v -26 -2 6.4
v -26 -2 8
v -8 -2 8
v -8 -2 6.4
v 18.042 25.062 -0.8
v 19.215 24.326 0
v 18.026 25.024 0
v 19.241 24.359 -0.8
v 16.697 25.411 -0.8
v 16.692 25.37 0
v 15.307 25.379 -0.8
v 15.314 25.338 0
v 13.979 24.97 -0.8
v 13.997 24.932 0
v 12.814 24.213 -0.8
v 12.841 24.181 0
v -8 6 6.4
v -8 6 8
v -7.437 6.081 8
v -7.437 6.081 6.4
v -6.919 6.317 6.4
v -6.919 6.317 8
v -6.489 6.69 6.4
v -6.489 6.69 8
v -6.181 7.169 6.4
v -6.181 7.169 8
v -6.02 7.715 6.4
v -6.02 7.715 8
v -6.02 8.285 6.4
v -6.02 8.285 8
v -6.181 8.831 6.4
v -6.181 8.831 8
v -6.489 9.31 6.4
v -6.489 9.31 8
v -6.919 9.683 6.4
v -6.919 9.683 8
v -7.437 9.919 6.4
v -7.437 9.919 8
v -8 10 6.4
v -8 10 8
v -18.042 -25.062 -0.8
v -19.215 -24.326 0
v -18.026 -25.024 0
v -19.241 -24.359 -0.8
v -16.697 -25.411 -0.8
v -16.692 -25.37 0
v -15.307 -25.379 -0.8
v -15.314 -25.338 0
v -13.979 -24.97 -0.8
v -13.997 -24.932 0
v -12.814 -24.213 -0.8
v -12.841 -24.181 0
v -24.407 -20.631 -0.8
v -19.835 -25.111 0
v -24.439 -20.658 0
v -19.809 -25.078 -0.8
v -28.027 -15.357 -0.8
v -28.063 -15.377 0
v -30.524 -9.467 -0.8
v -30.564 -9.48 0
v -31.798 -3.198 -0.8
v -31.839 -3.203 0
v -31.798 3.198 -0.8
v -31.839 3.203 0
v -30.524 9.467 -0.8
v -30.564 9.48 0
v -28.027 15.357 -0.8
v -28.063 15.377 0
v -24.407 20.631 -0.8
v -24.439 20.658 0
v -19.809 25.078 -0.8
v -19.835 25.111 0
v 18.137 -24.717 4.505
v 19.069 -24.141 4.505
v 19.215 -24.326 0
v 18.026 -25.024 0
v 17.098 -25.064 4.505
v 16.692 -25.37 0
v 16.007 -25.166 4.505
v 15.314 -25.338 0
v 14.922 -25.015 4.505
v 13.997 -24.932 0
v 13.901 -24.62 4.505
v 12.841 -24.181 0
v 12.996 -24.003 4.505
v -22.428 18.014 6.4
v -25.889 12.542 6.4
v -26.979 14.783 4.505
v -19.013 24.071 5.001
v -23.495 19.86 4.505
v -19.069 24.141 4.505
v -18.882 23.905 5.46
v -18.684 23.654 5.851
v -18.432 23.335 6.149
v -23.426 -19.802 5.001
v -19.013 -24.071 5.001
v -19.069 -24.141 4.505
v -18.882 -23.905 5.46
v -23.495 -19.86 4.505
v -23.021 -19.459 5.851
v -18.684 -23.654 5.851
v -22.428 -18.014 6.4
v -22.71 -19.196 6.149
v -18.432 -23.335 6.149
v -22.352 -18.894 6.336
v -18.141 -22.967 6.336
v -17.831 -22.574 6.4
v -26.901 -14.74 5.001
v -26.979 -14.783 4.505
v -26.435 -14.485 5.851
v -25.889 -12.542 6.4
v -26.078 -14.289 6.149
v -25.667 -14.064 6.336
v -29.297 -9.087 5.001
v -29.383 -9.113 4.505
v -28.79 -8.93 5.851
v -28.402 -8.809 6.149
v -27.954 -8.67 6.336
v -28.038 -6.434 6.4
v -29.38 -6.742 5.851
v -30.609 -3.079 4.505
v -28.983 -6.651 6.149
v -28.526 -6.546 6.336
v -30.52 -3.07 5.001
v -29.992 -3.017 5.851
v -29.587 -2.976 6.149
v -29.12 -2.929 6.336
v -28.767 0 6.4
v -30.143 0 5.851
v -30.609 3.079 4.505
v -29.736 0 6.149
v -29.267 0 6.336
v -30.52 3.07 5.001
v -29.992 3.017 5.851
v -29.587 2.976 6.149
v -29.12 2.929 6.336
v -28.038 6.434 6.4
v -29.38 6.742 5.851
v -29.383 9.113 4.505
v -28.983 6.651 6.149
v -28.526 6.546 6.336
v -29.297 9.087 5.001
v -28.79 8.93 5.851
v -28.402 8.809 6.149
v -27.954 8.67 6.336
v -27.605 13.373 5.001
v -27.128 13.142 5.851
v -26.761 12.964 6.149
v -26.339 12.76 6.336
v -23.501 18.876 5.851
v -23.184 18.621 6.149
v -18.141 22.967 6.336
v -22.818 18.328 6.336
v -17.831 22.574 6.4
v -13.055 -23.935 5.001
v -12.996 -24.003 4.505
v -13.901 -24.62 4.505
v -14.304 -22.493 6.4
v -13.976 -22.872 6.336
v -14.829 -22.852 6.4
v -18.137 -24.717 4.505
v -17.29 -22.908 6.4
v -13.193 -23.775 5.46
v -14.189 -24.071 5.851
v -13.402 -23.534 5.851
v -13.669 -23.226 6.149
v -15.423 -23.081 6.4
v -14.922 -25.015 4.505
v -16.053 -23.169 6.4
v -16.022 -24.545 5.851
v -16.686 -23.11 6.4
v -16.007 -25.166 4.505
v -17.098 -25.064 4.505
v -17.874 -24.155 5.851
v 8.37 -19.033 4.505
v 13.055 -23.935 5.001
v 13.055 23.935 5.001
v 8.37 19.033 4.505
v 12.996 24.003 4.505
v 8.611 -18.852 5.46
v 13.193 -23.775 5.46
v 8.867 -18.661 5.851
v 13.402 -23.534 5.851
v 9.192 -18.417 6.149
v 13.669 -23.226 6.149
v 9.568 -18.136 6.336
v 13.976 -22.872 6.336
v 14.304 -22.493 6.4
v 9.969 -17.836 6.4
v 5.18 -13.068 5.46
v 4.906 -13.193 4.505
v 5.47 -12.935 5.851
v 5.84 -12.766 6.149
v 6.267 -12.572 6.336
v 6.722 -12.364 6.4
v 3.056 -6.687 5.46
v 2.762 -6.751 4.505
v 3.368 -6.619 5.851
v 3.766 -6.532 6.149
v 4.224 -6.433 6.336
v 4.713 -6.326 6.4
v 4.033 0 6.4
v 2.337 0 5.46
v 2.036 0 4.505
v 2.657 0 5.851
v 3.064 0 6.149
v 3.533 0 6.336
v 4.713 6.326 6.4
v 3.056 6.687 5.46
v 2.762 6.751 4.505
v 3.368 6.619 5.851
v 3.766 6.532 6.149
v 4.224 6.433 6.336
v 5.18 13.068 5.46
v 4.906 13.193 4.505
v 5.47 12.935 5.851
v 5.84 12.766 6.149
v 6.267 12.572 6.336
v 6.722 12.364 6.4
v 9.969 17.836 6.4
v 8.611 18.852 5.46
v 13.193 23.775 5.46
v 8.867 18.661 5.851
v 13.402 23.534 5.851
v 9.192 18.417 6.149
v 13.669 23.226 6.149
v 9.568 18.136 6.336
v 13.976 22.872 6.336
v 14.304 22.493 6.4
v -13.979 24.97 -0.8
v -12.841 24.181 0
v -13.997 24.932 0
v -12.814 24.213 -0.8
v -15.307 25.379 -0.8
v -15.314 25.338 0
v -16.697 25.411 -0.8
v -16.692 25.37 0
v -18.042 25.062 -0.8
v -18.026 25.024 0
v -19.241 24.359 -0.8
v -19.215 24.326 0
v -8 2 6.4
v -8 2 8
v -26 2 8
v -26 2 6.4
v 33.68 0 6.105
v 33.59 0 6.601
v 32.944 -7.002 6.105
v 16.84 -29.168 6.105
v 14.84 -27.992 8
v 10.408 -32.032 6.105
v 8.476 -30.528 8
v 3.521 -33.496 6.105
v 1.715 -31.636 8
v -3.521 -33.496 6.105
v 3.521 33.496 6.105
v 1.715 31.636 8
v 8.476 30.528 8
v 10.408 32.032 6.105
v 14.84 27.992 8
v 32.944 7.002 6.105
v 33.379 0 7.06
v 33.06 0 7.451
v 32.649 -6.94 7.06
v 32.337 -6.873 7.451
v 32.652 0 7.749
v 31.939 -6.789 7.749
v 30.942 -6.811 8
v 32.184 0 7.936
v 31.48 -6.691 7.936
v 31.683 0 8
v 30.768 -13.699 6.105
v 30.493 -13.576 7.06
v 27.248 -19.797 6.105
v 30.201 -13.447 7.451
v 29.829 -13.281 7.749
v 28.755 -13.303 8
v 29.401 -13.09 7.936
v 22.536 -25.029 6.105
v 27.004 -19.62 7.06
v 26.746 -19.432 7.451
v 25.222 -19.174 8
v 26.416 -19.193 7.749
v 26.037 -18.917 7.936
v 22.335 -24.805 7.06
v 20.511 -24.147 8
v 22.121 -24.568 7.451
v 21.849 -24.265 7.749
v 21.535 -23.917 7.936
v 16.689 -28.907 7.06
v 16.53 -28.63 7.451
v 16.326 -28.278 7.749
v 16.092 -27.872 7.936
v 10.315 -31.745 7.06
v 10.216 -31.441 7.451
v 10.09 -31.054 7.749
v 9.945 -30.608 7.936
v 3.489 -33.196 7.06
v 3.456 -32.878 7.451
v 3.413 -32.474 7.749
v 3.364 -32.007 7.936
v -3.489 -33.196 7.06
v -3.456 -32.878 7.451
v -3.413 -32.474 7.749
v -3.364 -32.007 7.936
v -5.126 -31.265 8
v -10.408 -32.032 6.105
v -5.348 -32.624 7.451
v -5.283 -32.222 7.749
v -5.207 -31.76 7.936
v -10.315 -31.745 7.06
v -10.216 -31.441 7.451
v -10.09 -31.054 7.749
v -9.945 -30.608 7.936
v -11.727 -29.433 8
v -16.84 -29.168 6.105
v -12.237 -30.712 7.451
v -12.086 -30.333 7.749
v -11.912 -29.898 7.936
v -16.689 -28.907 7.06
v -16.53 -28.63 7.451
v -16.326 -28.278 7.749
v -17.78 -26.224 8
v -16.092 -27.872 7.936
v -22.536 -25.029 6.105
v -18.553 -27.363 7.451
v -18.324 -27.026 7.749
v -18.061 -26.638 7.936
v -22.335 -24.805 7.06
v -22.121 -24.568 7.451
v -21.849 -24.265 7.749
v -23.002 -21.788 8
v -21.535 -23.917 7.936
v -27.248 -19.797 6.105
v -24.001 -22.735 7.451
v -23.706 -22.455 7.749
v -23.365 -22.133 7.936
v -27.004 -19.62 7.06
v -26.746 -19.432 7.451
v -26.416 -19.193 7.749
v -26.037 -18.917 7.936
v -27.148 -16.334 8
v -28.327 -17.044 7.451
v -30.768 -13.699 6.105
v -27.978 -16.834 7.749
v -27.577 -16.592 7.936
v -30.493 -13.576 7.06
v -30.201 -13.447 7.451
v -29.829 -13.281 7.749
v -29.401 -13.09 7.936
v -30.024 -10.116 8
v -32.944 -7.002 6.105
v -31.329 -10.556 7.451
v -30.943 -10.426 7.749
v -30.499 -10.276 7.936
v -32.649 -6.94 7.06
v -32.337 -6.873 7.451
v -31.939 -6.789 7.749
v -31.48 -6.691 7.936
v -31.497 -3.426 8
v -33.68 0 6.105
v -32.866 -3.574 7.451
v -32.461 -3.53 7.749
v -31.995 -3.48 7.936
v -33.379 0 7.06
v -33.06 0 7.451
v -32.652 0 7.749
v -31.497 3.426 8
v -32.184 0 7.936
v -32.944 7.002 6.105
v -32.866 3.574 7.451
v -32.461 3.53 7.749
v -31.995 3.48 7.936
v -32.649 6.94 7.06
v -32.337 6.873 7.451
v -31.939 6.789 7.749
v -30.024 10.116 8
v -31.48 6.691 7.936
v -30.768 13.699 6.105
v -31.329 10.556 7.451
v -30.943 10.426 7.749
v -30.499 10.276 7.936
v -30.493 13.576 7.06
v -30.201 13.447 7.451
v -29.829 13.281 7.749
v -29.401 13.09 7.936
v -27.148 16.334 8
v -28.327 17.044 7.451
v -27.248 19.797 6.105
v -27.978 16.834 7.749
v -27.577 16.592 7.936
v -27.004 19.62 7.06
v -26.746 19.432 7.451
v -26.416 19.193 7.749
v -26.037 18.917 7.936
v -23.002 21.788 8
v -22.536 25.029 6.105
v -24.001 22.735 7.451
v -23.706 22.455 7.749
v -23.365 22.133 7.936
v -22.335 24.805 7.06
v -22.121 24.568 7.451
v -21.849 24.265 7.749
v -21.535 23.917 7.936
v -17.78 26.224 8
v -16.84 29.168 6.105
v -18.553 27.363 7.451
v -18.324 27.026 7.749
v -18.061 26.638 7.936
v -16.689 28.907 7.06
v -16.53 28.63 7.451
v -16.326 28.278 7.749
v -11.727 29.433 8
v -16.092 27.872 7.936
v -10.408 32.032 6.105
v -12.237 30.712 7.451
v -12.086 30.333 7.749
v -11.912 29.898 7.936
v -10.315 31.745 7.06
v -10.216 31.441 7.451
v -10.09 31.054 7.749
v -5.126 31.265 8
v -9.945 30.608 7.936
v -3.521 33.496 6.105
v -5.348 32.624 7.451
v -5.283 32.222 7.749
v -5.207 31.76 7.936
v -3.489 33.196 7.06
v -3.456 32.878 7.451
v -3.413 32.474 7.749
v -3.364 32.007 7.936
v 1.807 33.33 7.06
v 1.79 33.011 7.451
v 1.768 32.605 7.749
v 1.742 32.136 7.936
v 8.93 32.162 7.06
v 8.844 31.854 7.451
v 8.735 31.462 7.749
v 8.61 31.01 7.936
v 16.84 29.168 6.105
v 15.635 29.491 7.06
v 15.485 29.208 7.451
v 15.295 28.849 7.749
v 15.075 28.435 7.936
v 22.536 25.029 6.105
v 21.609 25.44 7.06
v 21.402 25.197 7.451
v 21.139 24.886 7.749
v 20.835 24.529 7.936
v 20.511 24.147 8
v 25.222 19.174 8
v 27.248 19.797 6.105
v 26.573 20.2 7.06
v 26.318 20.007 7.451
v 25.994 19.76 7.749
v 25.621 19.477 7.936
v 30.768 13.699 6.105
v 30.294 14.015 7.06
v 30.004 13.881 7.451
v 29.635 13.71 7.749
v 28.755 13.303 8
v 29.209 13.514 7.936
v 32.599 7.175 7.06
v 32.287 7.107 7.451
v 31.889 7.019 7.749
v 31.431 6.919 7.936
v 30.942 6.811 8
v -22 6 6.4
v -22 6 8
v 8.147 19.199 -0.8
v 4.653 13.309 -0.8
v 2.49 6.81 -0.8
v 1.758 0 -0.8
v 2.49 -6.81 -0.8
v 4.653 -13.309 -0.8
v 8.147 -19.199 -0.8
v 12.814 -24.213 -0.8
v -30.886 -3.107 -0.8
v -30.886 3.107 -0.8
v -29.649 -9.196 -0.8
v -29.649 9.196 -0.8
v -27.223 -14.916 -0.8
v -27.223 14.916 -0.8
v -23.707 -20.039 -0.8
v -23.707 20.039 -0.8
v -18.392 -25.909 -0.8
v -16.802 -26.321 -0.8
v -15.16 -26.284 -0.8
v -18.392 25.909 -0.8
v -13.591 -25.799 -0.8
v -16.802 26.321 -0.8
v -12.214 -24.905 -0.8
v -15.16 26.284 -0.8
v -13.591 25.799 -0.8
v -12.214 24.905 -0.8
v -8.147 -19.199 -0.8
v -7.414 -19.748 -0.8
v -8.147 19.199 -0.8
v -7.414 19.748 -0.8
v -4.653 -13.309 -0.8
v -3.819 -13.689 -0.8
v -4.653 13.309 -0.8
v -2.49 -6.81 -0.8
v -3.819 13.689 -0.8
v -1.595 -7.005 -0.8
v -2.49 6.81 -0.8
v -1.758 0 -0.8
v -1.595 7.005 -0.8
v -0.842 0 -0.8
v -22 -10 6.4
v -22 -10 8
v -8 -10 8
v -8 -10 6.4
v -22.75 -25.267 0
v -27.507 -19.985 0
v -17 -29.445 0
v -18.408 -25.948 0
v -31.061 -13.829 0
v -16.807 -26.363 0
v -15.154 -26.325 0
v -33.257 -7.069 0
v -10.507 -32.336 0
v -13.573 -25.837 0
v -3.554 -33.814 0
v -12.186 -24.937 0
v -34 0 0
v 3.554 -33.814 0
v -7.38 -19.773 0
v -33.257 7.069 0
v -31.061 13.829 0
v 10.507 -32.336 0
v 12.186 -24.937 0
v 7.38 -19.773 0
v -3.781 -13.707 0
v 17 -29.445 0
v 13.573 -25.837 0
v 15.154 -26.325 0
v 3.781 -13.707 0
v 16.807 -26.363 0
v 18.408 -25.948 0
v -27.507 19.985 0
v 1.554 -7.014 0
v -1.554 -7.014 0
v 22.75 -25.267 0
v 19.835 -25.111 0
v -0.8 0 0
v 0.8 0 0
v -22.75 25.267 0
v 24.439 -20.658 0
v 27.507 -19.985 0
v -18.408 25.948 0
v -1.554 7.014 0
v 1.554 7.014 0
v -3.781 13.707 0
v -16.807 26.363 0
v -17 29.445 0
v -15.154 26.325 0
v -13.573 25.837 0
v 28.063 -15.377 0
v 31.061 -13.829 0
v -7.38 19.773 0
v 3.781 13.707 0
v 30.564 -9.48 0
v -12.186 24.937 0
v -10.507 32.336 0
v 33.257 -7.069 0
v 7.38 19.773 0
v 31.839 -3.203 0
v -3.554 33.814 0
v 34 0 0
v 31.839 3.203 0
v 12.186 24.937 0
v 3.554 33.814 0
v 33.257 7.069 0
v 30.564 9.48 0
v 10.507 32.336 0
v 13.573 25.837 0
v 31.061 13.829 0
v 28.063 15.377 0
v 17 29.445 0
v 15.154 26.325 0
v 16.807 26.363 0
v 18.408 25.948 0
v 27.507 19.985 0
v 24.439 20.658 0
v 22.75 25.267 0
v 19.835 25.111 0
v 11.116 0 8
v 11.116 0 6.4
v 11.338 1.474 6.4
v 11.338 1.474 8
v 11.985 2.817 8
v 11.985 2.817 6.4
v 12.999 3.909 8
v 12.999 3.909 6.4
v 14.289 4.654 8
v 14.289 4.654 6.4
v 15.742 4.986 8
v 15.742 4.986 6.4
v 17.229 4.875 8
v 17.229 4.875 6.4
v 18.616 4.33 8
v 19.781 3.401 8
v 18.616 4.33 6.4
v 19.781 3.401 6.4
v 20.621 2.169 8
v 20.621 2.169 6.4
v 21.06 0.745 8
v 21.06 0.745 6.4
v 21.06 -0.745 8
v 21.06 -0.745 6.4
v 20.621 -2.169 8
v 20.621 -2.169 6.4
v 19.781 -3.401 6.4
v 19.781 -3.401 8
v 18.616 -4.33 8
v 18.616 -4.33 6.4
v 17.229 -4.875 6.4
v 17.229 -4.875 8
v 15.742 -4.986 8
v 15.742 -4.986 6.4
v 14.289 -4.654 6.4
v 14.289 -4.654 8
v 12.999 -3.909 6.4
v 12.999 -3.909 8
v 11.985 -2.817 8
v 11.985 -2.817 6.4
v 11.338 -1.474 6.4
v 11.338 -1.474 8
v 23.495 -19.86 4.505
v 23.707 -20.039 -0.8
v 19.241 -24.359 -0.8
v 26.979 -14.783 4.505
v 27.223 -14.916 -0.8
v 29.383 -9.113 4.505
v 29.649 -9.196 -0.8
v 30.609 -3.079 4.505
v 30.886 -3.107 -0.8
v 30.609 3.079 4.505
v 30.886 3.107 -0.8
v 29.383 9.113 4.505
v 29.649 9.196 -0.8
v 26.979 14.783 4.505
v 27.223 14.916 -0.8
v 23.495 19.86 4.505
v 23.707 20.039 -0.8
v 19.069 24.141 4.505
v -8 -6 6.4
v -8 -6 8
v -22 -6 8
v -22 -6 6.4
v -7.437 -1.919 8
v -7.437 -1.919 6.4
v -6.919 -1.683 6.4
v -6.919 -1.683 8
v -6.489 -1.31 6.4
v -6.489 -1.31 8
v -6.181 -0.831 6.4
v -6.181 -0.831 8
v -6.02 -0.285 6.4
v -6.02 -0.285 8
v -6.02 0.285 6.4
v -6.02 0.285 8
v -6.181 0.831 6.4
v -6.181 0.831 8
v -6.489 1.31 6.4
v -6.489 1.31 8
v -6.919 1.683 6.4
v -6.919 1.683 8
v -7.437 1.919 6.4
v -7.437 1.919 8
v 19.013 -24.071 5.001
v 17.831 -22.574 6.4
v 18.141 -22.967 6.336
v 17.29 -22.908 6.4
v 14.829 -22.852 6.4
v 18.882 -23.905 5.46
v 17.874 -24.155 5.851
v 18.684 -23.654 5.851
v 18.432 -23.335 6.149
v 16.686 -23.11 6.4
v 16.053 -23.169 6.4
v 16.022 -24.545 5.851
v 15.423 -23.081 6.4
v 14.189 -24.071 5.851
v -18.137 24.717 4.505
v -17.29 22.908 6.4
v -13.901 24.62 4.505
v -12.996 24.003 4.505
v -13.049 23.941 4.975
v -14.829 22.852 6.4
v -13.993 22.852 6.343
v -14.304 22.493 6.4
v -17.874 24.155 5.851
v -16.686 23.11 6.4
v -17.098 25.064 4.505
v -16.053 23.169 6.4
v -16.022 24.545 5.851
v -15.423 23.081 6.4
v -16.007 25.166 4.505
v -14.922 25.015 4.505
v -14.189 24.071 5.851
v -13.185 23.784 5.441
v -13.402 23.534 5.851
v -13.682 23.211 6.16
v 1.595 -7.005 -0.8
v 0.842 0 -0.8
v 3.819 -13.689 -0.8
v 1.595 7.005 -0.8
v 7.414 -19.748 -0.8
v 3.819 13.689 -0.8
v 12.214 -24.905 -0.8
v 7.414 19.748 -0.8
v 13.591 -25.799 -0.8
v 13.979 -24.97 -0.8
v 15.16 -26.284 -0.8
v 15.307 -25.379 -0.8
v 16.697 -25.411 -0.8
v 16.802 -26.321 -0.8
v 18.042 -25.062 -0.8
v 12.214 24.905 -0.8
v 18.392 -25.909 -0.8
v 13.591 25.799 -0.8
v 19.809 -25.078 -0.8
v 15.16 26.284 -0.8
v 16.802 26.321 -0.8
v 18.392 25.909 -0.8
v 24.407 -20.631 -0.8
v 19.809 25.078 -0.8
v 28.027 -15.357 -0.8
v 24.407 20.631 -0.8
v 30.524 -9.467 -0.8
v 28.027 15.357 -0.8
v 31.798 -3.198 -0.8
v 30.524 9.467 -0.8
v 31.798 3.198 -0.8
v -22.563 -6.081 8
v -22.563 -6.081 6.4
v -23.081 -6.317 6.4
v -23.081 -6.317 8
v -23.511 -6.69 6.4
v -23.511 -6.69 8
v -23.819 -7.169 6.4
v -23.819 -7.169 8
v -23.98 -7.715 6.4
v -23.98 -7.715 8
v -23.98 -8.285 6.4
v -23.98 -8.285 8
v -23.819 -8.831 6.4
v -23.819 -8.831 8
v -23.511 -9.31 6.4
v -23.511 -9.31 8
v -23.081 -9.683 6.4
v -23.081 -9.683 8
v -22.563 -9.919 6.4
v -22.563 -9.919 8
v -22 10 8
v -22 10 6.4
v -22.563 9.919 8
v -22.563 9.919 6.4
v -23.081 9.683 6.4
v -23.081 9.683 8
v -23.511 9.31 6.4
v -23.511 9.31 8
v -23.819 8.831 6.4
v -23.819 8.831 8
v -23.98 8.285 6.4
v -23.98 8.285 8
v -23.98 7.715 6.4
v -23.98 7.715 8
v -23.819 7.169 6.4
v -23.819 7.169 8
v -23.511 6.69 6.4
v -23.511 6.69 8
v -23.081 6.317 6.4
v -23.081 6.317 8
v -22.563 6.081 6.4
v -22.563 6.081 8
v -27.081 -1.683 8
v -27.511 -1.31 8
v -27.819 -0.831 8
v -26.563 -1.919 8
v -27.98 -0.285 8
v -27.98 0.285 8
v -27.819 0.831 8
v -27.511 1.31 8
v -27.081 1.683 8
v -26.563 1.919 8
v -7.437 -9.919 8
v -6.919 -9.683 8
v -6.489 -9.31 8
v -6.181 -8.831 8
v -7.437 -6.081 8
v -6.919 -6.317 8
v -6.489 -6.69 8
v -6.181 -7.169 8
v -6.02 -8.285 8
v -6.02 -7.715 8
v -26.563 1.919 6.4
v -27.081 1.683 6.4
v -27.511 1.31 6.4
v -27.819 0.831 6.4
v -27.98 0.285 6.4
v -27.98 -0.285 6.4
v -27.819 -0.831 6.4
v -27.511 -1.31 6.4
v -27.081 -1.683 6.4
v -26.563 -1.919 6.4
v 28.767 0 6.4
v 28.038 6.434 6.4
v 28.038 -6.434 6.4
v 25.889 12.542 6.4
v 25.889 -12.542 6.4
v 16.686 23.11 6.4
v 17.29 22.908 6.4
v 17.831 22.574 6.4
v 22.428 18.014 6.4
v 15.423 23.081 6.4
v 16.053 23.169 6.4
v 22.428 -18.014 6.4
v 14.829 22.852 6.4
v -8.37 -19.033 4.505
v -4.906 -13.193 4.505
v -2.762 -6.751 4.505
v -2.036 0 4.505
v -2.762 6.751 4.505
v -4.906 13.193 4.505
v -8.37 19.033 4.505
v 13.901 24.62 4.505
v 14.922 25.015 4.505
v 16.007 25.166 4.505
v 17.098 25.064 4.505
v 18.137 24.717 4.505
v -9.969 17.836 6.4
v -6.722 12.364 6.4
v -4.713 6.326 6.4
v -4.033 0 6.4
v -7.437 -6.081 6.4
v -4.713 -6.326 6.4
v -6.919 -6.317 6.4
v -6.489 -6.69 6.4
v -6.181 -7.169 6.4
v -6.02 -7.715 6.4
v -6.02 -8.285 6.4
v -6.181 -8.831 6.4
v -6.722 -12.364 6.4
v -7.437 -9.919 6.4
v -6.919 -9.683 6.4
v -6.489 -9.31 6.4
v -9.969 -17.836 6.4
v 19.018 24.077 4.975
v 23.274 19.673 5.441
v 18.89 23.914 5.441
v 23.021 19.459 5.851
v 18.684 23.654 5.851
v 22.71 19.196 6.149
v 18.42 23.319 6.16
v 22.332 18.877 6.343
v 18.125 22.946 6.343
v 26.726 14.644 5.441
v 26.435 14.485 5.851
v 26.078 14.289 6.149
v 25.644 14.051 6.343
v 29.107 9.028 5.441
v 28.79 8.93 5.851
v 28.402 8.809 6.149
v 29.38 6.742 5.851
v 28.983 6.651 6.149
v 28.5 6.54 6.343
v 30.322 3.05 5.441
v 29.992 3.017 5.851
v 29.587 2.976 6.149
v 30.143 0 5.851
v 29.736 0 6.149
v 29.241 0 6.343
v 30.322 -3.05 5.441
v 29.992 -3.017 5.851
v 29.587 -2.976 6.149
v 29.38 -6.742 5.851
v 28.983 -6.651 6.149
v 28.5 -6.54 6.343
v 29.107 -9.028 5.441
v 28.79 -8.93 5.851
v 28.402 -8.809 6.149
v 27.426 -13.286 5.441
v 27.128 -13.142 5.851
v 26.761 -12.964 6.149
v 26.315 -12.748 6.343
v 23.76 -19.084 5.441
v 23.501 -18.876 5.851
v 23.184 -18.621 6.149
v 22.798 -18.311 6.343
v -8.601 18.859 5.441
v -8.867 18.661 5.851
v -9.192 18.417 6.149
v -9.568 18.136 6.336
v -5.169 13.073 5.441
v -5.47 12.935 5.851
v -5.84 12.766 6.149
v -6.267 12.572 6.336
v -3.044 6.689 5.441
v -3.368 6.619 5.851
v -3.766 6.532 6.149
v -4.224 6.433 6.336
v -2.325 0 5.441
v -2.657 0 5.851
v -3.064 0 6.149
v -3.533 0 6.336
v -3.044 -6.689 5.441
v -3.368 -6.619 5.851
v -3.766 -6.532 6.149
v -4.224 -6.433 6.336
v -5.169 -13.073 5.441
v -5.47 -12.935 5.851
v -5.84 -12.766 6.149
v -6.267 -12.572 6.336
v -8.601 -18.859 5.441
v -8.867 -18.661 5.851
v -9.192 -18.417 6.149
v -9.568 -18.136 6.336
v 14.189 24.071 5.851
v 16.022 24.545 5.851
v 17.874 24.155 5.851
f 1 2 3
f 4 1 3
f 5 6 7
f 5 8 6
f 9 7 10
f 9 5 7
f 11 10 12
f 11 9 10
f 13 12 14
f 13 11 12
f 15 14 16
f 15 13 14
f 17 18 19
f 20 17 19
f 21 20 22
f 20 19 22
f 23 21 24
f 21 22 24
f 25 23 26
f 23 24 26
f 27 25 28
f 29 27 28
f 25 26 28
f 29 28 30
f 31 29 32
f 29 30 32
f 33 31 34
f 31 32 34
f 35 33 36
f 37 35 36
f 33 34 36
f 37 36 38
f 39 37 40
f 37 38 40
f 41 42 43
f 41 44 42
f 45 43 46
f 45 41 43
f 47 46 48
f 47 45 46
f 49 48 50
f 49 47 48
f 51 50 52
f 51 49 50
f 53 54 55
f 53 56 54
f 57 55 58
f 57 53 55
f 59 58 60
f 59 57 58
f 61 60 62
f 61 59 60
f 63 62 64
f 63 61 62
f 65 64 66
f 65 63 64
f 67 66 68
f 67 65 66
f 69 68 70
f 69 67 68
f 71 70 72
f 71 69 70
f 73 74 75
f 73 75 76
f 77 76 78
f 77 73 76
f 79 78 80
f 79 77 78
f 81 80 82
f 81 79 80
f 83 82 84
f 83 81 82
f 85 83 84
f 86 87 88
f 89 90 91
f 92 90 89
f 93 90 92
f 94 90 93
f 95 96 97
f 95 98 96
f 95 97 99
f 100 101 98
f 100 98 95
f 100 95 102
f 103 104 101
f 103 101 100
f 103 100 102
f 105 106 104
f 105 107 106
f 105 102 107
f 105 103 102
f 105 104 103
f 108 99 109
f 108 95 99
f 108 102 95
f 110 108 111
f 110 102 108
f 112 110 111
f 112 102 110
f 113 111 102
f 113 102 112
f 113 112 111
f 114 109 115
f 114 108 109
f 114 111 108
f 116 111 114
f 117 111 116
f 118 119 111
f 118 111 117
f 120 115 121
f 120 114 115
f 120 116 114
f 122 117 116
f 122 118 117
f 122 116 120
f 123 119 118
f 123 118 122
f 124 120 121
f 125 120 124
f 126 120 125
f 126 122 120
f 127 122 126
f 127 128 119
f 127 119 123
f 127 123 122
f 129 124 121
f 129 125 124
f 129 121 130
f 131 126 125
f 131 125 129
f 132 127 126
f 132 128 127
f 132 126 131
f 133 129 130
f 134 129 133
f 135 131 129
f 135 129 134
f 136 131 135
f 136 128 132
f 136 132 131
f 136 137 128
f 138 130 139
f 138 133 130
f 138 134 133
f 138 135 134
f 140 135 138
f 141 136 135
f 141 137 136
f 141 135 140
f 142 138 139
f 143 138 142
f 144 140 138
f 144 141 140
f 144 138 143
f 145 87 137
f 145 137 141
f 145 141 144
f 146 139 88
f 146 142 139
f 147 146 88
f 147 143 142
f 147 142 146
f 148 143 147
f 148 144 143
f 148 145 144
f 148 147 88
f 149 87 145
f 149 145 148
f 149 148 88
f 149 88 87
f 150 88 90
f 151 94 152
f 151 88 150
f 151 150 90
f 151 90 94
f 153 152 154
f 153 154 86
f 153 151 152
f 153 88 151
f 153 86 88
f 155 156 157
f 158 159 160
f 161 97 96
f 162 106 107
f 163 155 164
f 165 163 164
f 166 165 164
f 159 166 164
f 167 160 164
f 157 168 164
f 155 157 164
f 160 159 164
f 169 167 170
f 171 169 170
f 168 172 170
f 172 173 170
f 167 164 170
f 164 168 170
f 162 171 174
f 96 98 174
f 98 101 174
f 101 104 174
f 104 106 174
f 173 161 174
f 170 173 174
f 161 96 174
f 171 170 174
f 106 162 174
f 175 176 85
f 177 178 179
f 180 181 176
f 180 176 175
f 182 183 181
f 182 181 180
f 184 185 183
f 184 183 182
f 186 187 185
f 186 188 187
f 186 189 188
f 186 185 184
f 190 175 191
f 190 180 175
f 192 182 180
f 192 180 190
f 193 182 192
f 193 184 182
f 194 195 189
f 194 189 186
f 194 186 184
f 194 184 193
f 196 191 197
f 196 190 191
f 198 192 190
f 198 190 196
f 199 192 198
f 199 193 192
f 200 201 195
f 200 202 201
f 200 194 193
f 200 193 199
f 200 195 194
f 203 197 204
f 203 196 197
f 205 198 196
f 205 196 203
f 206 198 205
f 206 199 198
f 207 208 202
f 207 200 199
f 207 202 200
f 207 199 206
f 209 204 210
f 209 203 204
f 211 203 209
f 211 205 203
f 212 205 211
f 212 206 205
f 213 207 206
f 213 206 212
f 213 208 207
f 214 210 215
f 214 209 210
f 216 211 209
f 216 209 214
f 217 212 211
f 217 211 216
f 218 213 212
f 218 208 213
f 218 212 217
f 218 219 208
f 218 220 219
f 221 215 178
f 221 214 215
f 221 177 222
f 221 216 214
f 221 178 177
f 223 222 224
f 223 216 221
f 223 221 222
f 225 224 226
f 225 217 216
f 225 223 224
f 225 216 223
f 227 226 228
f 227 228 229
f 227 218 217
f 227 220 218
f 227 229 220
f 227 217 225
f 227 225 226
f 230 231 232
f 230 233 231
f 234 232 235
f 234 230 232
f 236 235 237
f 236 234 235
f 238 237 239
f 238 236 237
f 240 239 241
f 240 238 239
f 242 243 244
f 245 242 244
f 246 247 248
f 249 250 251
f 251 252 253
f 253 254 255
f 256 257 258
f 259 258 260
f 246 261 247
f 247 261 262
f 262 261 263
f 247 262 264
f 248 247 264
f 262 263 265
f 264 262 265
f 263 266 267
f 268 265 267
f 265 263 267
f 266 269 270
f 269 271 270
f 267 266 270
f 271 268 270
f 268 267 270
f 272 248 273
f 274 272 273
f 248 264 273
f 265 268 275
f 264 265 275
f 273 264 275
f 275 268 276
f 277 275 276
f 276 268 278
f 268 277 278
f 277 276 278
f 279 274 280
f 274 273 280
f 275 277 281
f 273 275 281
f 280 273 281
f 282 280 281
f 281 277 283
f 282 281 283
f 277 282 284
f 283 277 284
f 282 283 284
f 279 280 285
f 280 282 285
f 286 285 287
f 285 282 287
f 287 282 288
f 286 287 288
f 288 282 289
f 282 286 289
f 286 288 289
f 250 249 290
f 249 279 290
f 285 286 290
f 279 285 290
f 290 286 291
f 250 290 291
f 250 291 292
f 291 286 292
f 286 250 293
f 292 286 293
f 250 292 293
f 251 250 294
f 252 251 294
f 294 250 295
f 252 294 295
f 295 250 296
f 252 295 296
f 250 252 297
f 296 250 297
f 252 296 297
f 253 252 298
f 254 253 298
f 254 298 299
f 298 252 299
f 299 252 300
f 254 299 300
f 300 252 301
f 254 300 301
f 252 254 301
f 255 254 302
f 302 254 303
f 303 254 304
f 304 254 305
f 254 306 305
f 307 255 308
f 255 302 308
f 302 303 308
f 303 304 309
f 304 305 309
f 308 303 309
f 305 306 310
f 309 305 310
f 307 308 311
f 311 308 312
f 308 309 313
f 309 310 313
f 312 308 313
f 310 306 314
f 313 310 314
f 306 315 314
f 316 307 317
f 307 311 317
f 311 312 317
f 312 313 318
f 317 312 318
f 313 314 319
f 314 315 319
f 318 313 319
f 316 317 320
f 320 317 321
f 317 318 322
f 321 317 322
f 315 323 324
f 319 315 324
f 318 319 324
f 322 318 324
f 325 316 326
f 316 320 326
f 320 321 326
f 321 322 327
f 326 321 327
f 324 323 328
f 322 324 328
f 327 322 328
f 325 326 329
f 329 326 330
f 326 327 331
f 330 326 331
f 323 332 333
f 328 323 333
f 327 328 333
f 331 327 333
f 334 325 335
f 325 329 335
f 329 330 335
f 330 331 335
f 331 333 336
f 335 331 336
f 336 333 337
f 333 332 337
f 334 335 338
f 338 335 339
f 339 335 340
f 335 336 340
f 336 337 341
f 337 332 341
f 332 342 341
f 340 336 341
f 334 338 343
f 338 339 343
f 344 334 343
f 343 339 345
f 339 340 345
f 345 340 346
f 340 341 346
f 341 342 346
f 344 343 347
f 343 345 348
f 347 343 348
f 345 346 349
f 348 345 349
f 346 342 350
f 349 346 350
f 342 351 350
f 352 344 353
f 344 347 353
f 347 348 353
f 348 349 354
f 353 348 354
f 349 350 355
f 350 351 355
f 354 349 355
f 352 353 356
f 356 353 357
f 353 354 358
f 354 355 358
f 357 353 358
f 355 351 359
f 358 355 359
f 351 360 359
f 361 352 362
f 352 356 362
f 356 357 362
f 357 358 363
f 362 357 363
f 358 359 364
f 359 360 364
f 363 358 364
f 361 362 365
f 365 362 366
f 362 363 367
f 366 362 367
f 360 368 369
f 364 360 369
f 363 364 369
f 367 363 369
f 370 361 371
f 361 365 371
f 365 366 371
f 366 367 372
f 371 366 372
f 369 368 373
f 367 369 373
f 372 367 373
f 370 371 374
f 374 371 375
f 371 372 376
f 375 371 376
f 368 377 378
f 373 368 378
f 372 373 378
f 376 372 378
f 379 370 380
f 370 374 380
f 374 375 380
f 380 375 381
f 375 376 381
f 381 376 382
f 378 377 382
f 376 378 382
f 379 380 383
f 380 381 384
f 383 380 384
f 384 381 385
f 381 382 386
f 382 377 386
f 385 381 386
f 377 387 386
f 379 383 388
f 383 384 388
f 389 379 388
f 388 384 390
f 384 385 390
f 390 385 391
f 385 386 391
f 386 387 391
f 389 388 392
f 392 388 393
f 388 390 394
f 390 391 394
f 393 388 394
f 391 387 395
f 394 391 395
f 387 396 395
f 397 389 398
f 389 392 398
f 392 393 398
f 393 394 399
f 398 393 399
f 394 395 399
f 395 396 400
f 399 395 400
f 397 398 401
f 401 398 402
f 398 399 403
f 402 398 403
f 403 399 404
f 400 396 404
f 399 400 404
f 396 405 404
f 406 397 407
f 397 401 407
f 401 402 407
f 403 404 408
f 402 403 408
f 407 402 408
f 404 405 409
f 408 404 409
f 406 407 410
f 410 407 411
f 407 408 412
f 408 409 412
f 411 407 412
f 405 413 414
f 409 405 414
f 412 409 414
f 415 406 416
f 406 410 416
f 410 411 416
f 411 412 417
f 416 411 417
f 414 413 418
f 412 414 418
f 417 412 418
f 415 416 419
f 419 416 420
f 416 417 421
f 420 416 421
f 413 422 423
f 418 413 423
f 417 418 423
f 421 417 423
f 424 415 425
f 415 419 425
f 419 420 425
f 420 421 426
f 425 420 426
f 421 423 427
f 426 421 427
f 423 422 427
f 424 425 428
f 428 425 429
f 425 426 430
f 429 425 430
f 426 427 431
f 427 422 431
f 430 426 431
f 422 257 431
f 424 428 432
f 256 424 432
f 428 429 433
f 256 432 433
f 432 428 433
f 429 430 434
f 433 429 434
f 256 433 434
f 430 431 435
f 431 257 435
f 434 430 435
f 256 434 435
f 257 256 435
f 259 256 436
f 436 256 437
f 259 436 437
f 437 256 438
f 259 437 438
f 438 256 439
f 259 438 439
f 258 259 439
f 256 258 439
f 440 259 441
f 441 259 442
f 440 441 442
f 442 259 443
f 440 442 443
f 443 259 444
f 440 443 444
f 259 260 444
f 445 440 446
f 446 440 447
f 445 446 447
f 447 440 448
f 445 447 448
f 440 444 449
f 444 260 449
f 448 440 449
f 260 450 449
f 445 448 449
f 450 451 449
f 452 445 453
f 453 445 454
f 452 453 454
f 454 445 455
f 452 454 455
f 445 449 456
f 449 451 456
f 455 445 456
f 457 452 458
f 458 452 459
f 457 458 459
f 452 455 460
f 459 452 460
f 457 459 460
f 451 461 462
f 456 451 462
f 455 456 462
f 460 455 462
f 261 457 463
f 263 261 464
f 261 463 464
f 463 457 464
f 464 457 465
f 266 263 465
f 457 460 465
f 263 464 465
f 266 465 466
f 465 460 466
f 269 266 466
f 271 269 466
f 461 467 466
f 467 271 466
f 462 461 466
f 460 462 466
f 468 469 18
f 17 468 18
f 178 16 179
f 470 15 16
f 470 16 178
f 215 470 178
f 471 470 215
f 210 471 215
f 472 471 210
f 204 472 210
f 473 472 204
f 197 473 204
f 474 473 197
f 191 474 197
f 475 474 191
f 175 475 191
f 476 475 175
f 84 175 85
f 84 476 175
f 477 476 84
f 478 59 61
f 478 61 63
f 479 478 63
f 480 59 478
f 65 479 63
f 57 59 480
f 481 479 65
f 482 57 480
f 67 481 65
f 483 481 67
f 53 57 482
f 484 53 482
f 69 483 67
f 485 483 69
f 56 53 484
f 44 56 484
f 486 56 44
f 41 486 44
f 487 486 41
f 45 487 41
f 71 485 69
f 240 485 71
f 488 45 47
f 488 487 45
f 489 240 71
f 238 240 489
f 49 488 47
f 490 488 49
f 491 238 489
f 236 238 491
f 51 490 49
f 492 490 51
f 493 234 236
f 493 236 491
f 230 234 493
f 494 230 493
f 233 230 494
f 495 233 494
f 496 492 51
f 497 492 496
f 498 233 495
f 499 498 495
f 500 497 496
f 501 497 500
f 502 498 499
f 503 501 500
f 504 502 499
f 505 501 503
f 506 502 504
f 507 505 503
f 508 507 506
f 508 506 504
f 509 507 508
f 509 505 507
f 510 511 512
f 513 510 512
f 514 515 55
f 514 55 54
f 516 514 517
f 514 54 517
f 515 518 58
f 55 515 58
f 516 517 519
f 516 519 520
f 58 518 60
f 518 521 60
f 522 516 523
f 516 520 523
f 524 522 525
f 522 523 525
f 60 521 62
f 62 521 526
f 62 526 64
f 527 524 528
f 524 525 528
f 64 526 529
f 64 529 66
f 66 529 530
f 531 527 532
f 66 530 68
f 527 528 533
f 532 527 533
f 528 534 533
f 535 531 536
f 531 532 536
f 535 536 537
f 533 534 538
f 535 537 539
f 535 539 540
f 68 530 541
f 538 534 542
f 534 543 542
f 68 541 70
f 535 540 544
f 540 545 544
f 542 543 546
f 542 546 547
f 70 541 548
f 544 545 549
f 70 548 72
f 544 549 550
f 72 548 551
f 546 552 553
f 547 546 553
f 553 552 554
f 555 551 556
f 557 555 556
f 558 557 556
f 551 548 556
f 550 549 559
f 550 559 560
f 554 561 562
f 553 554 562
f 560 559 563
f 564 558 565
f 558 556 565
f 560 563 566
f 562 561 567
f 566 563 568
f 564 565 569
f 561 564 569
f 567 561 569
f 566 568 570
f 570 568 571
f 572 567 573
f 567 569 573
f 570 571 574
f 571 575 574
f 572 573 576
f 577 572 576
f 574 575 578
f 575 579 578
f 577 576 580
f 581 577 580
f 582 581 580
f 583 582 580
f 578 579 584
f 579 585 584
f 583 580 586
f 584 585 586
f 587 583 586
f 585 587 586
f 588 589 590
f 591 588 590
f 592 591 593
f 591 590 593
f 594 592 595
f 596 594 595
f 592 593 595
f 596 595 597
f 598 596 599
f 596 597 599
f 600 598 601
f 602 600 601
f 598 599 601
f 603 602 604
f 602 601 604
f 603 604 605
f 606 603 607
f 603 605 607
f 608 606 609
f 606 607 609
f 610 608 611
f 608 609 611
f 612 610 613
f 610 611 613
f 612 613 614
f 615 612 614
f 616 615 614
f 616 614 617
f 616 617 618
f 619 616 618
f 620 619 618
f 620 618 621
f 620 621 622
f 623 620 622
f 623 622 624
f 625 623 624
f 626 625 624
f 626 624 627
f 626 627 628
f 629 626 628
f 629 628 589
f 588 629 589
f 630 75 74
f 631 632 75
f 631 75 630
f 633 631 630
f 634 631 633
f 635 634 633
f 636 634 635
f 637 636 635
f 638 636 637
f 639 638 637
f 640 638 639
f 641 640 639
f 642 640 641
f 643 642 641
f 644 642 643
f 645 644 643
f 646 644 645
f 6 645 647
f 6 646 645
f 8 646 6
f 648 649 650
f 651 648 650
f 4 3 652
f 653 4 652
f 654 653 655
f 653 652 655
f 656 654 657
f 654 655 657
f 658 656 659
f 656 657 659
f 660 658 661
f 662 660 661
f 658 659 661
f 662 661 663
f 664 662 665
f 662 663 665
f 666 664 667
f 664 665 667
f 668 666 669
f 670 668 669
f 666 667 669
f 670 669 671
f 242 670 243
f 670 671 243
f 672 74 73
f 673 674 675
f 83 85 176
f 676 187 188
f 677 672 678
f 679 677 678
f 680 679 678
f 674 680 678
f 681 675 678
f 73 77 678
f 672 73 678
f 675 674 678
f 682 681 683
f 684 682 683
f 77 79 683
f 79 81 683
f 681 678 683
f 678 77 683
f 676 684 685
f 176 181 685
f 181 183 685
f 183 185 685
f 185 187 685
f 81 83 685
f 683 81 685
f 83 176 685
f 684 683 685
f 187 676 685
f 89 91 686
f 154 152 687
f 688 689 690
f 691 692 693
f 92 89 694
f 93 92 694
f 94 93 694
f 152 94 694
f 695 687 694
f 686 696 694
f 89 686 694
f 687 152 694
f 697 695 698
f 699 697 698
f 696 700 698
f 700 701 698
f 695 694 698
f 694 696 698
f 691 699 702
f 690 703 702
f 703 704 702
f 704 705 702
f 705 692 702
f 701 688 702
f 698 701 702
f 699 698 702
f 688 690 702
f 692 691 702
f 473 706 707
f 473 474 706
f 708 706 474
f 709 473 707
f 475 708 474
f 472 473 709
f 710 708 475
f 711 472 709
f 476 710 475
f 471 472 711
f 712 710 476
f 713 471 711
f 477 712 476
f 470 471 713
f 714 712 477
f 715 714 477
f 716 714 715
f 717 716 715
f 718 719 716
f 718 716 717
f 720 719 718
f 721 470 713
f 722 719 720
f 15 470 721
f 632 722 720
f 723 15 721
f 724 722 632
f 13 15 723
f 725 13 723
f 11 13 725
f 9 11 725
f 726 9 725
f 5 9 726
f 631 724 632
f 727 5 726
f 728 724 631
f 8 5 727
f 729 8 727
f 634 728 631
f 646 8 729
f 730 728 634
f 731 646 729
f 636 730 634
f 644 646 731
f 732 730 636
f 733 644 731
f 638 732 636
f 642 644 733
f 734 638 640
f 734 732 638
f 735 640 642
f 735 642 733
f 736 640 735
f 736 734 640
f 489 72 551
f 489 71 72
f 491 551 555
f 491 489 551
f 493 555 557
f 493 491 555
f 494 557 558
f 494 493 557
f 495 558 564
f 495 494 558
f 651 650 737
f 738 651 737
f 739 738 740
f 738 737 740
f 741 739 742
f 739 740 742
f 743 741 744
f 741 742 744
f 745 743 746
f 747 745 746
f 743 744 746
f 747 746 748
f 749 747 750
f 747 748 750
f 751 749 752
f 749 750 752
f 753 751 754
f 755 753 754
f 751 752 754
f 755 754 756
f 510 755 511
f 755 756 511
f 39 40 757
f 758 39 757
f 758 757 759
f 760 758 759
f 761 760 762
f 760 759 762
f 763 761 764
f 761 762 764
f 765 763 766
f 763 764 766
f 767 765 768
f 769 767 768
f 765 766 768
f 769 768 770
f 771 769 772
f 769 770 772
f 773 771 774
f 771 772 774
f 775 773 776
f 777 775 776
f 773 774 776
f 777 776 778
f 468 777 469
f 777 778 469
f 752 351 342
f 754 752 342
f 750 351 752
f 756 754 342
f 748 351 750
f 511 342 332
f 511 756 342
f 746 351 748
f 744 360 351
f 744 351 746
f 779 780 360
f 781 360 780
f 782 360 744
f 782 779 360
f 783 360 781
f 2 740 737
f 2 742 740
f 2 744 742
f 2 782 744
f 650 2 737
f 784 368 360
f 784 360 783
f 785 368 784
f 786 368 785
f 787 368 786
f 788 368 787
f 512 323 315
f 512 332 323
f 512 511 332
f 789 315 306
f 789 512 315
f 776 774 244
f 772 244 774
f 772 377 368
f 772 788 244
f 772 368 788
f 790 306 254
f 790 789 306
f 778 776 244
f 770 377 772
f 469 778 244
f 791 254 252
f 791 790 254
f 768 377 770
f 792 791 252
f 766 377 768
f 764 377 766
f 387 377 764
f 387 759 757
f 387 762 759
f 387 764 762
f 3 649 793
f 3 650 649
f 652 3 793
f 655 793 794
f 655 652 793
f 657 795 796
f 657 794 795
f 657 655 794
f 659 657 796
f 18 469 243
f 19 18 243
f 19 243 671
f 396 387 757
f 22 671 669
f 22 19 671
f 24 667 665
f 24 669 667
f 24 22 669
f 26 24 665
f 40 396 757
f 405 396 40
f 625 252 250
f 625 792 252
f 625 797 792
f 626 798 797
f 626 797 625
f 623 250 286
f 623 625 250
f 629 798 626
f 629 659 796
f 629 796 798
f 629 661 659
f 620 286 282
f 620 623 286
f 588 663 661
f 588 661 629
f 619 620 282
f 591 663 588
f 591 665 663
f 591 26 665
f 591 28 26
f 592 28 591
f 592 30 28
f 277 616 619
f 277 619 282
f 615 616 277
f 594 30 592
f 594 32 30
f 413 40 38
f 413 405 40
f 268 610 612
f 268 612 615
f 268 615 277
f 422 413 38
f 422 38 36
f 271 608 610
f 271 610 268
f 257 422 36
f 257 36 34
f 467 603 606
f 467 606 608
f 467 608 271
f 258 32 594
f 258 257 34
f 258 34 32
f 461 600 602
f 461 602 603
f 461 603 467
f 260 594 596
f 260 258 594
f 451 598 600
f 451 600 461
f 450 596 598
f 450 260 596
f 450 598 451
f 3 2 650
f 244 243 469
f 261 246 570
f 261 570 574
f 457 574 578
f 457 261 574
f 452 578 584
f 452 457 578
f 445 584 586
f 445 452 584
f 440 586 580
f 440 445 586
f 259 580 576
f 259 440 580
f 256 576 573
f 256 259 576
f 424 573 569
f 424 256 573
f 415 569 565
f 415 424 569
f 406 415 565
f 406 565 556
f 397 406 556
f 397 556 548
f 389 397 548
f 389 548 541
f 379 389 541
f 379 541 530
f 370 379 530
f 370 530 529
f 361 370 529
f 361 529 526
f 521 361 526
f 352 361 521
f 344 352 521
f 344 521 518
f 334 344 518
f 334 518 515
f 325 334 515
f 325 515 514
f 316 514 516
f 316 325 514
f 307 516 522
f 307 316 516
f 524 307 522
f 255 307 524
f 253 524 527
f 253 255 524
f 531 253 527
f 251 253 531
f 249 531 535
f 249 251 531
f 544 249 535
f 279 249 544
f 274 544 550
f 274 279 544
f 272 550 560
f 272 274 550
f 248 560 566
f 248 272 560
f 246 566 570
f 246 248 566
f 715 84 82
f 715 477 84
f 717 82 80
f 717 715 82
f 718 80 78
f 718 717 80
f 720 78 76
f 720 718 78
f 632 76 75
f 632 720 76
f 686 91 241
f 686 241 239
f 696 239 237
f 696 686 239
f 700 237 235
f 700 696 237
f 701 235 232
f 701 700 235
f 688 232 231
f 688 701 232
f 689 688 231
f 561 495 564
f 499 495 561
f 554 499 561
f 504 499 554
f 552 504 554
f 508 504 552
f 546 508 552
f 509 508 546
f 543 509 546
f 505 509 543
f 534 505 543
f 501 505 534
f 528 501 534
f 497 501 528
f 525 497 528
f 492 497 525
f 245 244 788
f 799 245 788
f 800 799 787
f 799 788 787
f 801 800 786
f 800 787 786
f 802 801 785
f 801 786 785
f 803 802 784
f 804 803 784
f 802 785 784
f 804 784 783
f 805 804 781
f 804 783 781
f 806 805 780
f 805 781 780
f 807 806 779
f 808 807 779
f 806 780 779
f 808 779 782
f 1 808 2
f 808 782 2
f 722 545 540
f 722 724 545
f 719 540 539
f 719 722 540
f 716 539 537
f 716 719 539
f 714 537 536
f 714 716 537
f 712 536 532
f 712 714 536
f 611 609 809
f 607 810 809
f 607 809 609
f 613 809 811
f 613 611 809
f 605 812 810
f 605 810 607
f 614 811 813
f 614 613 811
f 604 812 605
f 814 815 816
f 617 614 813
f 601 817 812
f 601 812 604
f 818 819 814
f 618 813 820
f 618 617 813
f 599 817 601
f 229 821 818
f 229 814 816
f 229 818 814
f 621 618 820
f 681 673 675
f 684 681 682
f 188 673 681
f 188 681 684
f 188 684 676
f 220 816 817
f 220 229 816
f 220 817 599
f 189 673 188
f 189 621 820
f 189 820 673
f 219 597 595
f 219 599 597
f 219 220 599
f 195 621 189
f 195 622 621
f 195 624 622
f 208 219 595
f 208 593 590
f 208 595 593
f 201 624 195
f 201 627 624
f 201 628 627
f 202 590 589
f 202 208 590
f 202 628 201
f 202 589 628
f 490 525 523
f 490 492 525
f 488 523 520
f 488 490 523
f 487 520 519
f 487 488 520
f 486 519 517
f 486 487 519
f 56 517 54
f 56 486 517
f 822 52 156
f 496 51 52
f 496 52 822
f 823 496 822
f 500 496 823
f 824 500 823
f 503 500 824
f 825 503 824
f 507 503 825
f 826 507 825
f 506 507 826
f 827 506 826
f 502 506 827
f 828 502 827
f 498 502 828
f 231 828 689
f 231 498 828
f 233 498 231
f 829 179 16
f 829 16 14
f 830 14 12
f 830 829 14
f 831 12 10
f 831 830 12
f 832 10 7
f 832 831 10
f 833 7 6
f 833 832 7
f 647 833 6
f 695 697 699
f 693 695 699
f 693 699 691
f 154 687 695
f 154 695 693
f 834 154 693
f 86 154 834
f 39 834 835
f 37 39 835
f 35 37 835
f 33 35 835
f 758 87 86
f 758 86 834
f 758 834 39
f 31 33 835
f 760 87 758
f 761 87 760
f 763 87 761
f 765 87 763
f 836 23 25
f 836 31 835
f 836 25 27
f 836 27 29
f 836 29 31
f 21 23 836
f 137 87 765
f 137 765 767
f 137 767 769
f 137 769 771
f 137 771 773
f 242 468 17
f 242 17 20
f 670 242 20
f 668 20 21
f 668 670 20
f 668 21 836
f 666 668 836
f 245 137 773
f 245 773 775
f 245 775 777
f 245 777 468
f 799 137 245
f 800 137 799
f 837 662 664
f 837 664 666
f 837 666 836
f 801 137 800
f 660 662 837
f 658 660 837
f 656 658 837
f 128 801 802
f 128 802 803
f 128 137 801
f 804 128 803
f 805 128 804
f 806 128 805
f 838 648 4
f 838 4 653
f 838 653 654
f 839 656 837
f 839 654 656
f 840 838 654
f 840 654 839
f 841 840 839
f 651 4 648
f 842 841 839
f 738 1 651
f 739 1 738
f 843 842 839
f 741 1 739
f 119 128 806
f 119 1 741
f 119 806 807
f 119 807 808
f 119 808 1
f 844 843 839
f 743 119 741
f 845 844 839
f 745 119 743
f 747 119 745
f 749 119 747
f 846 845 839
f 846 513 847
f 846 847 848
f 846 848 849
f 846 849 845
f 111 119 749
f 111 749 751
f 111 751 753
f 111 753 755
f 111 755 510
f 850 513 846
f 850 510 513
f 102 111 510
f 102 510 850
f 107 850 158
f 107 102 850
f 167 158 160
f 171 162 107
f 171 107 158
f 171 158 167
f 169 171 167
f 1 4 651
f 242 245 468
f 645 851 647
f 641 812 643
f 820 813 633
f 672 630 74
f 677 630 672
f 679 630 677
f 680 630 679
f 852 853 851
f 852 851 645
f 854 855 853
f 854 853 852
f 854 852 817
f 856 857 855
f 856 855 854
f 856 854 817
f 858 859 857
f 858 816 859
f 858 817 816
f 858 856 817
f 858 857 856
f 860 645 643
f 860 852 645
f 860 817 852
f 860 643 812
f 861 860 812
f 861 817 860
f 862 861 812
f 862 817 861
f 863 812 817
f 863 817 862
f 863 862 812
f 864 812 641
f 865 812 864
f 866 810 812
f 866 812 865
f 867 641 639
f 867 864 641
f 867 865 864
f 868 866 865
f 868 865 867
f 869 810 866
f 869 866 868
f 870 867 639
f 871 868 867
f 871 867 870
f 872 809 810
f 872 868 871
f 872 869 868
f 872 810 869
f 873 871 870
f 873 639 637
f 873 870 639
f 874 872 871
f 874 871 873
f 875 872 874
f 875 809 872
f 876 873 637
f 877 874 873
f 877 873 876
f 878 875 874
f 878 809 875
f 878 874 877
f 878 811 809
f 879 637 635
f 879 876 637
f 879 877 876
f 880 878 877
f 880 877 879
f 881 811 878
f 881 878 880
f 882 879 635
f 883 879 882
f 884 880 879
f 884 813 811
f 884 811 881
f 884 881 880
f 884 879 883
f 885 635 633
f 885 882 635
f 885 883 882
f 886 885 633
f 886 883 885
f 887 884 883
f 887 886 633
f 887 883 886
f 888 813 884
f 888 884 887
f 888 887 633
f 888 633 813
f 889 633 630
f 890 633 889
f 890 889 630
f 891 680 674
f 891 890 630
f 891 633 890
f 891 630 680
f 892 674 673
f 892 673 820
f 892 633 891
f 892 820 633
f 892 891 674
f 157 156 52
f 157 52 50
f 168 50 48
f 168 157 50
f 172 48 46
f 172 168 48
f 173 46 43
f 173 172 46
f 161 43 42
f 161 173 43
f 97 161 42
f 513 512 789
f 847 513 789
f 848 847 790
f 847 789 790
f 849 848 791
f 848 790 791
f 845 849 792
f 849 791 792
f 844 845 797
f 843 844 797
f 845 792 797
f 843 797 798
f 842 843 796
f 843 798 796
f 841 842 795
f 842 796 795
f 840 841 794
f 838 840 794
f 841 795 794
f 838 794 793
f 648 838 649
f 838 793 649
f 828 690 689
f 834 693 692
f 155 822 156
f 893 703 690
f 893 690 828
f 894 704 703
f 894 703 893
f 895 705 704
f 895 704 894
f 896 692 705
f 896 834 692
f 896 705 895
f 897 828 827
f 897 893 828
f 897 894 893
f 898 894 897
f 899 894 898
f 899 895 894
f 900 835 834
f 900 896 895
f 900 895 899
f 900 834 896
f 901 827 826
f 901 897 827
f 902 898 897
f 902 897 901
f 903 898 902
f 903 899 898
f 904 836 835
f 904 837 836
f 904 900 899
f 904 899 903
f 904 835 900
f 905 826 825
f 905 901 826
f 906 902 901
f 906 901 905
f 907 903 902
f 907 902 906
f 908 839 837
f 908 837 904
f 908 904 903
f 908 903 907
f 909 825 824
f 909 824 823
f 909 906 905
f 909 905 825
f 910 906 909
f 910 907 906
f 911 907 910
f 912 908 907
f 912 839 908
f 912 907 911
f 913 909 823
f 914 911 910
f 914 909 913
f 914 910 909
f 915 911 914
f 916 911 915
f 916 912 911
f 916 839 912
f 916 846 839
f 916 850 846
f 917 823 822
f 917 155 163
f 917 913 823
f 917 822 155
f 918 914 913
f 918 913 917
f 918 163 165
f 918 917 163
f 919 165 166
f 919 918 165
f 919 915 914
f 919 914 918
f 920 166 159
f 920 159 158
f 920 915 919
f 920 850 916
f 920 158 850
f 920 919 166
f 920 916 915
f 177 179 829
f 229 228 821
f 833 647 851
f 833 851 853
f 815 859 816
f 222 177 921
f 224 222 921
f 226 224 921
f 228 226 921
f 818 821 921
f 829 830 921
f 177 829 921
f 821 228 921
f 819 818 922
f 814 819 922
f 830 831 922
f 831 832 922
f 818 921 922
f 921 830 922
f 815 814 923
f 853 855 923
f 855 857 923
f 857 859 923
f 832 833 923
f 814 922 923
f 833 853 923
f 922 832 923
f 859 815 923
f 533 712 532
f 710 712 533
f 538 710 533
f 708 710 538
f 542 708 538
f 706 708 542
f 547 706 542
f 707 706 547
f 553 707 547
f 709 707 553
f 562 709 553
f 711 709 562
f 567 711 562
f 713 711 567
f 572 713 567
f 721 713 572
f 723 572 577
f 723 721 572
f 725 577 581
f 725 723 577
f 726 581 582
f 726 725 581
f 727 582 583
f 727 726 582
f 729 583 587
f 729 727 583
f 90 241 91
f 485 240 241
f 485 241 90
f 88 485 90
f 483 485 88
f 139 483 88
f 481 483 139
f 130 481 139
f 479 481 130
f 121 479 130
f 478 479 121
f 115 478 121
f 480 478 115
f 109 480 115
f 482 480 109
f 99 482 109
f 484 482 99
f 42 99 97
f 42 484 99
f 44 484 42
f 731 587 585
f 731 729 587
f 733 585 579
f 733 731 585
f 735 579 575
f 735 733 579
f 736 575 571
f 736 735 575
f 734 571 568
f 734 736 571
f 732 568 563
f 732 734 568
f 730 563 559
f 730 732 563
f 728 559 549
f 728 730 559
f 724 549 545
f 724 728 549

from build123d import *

# Parameters (mm, degrees)
F0_R      = 34
F1_DEPTH  = 8
F1_TAPER  = 3
F3_DEPTH  = 6.4
F3_TAPER  = 3
F5_DEPTH  = 0.8
F5_TAPER  = 3
F6_R      = 2
F8_D      = 10
F10_DEPTH = 8.8010001
F12_DEPTH = 8.8010001


with BuildPart() as f1:
    # F0 (on Top) → F1 (new body)
    with BuildSketch(Plane.XY):
        Circle(F0_R)
    extrude(amount=F1_DEPTH, taper=F1_TAPER)

    # F2 (on face) → F3 (cut)
    with BuildSketch(Plane(origin=(0, 0, 0), x_dir=(1, 0, 0), z_dir=(0, 0, -1))):
        with BuildLine():
            ThreePointArc((-12.8411571335, 24.1811270559), (-16.0020129755, 25.4015270201), (-19.2152025489, 24.3264463291))
            ThreePointArc((-19.2152025489, 24.3264463291), (-31, 0), (-19.2152025489, -24.3264463291))
            ThreePointArc((-19.2152025489, -24.3264463291), (-16.0020129755, -25.4015270201), (-12.8411571335, -24.1811270559))
            ThreePointArc((-12.8411571335, -24.1811270559), (-1.8, 0), (-12.8411571335, 24.1811270559))
        make_face()
        with BuildLine():
            ThreePointArc((12.8411571335, 24.1811270559), (1.8, 0), (12.8411571335, -24.1811270559))
            ThreePointArc((12.8411571335, -24.1811270559), (16.0020129755, -25.4015270201), (19.2152025489, -24.3264463291))
            ThreePointArc((19.2152025489, -24.3264463291), (31, 0), (19.2152025489, 24.3264463291))
            ThreePointArc((19.2152025489, 24.3264463291), (16.0020129755, 25.4015270201), (12.8411571335, 24.1811270559))
        make_face()
    extrude(amount=-F3_DEPTH, taper=F3_TAPER, mode=Mode.SUBTRACT)

    # F4 (on face) → F5 (join)
    with BuildSketch(Plane(origin=(0, 0, 0), x_dir=(1, 0, 0), z_dir=(0, 0, -1))):
        with BuildLine():
            ThreePointArc((-12.1861932939, -24.9367872764), (-0.8, 0), (-12.1861932939, 24.9367872764))
            ThreePointArc((-12.1861932939, 24.9367872764), (-15.9792203044, 26.4012672334), (-19.8350477924, 25.1111704043))
            ThreePointArc((-19.8350477924, 25.1111704043), (-32, 0), (-19.8350477924, -25.1111704043))
            ThreePointArc((-19.8350477924, -25.1111704043), (-15.9792203044, -26.4012672334), (-12.1861932939, -24.9367872764))
        make_face()
        with BuildLine():
            ThreePointArc((-19.2152025489, -24.3264463291), (-31, 0), (-19.2152025489, 24.3264463291))
            ThreePointArc((-19.2152025489, 24.3264463291), (-16.0020129755, 25.4015270201), (-12.8411571335, 24.1811270559))
            ThreePointArc((-12.8411571335, 24.1811270559), (-1.8, 0), (-12.8411571335, -24.1811270559))
            ThreePointArc((-12.8411571335, -24.1811270559), (-16.0020129755, -25.4015270201), (-19.2152025489, -24.3264463291))
        make_face(mode=Mode.SUBTRACT)
        with BuildLine():
            ThreePointArc((19.8350477924, -25.1111704043), (32, 0), (19.8350477924, 25.1111704043))
            ThreePointArc((19.8350477924, 25.1111704043), (15.9792203044, 26.4012672334), (12.1861932939, 24.9367872764))
            ThreePointArc((12.1861932939, 24.9367872764), (0.8, 0), (12.1861932939, -24.9367872764))
            ThreePointArc((12.1861932939, -24.9367872764), (15.9792203044, -26.4012672334), (19.8350477924, -25.1111704043))
        make_face()
        with BuildLine():
            ThreePointArc((12.8411571335, 24.1811270559), (16.0020129755, 25.4015270201), (19.2152025489, 24.3264463291))
            ThreePointArc((19.2152025489, 24.3264463291), (31, 0), (19.2152025489, -24.3264463291))
            ThreePointArc((19.2152025489, -24.3264463291), (16.0020129755, -25.4015270201), (12.8411571335, -24.1811270559))
            ThreePointArc((12.8411571335, -24.1811270559), (1.8, 0), (12.8411571335, 24.1811270559))
        make_face(mode=Mode.SUBTRACT)
    extrude(amount=F5_DEPTH, taper=F5_TAPER)

    # F6
    f6_edges = [f1.edges().sort_by_distance(p)[0] for p in [
        (-33.580738, 0, 8),
        (-30.66459, 0, 6.4),
        (2.13541, 0, 6.4),
    ]]
    fillet(f6_edges, radius=F6_R)

    # F8 (through all)
    with Locations(Plane.XY.offset(8)):
        with Locations((16.1159763314, 0)):
            Hole(F8_D / 2)

    # F9 (on face) → F10 (cut, through all)
    with BuildSketch(Plane.XY.offset(8)):
        with BuildLine():
            Line((-26, -2), (-8, -2))
            ThreePointArc((-8, -2), (-6, 0), (-8, 2))
            Line((-8, 2), (-26, 2))
            ThreePointArc((-26, 2), (-28, 0), (-26, -2))
        make_face()
    extrude(amount=-F10_DEPTH, mode=Mode.SUBTRACT)

    # F11 (on face) → F12 (cut, through all)
    with BuildSketch(Plane.XY.offset(8)):
        with BuildLine():
            Line((-22, 6), (-8, 6))
            ThreePointArc((-8, 6), (-6, 8), (-8, 10))
            Line((-8, 10), (-22, 10))
            ThreePointArc((-22, 10), (-24, 8), (-22, 6))
        make_face()
        with BuildLine():
            ThreePointArc((-8, -10), (-6, -8), (-8, -6))
            Line((-8, -6), (-22, -6))
            ThreePointArc((-22, -6), (-24, -8), (-22, -10))
            Line((-22, -10), (-8, -10))
        make_face()
    extrude(amount=-F12_DEPTH, mode=Mode.SUBTRACT)


solid = f1.part
